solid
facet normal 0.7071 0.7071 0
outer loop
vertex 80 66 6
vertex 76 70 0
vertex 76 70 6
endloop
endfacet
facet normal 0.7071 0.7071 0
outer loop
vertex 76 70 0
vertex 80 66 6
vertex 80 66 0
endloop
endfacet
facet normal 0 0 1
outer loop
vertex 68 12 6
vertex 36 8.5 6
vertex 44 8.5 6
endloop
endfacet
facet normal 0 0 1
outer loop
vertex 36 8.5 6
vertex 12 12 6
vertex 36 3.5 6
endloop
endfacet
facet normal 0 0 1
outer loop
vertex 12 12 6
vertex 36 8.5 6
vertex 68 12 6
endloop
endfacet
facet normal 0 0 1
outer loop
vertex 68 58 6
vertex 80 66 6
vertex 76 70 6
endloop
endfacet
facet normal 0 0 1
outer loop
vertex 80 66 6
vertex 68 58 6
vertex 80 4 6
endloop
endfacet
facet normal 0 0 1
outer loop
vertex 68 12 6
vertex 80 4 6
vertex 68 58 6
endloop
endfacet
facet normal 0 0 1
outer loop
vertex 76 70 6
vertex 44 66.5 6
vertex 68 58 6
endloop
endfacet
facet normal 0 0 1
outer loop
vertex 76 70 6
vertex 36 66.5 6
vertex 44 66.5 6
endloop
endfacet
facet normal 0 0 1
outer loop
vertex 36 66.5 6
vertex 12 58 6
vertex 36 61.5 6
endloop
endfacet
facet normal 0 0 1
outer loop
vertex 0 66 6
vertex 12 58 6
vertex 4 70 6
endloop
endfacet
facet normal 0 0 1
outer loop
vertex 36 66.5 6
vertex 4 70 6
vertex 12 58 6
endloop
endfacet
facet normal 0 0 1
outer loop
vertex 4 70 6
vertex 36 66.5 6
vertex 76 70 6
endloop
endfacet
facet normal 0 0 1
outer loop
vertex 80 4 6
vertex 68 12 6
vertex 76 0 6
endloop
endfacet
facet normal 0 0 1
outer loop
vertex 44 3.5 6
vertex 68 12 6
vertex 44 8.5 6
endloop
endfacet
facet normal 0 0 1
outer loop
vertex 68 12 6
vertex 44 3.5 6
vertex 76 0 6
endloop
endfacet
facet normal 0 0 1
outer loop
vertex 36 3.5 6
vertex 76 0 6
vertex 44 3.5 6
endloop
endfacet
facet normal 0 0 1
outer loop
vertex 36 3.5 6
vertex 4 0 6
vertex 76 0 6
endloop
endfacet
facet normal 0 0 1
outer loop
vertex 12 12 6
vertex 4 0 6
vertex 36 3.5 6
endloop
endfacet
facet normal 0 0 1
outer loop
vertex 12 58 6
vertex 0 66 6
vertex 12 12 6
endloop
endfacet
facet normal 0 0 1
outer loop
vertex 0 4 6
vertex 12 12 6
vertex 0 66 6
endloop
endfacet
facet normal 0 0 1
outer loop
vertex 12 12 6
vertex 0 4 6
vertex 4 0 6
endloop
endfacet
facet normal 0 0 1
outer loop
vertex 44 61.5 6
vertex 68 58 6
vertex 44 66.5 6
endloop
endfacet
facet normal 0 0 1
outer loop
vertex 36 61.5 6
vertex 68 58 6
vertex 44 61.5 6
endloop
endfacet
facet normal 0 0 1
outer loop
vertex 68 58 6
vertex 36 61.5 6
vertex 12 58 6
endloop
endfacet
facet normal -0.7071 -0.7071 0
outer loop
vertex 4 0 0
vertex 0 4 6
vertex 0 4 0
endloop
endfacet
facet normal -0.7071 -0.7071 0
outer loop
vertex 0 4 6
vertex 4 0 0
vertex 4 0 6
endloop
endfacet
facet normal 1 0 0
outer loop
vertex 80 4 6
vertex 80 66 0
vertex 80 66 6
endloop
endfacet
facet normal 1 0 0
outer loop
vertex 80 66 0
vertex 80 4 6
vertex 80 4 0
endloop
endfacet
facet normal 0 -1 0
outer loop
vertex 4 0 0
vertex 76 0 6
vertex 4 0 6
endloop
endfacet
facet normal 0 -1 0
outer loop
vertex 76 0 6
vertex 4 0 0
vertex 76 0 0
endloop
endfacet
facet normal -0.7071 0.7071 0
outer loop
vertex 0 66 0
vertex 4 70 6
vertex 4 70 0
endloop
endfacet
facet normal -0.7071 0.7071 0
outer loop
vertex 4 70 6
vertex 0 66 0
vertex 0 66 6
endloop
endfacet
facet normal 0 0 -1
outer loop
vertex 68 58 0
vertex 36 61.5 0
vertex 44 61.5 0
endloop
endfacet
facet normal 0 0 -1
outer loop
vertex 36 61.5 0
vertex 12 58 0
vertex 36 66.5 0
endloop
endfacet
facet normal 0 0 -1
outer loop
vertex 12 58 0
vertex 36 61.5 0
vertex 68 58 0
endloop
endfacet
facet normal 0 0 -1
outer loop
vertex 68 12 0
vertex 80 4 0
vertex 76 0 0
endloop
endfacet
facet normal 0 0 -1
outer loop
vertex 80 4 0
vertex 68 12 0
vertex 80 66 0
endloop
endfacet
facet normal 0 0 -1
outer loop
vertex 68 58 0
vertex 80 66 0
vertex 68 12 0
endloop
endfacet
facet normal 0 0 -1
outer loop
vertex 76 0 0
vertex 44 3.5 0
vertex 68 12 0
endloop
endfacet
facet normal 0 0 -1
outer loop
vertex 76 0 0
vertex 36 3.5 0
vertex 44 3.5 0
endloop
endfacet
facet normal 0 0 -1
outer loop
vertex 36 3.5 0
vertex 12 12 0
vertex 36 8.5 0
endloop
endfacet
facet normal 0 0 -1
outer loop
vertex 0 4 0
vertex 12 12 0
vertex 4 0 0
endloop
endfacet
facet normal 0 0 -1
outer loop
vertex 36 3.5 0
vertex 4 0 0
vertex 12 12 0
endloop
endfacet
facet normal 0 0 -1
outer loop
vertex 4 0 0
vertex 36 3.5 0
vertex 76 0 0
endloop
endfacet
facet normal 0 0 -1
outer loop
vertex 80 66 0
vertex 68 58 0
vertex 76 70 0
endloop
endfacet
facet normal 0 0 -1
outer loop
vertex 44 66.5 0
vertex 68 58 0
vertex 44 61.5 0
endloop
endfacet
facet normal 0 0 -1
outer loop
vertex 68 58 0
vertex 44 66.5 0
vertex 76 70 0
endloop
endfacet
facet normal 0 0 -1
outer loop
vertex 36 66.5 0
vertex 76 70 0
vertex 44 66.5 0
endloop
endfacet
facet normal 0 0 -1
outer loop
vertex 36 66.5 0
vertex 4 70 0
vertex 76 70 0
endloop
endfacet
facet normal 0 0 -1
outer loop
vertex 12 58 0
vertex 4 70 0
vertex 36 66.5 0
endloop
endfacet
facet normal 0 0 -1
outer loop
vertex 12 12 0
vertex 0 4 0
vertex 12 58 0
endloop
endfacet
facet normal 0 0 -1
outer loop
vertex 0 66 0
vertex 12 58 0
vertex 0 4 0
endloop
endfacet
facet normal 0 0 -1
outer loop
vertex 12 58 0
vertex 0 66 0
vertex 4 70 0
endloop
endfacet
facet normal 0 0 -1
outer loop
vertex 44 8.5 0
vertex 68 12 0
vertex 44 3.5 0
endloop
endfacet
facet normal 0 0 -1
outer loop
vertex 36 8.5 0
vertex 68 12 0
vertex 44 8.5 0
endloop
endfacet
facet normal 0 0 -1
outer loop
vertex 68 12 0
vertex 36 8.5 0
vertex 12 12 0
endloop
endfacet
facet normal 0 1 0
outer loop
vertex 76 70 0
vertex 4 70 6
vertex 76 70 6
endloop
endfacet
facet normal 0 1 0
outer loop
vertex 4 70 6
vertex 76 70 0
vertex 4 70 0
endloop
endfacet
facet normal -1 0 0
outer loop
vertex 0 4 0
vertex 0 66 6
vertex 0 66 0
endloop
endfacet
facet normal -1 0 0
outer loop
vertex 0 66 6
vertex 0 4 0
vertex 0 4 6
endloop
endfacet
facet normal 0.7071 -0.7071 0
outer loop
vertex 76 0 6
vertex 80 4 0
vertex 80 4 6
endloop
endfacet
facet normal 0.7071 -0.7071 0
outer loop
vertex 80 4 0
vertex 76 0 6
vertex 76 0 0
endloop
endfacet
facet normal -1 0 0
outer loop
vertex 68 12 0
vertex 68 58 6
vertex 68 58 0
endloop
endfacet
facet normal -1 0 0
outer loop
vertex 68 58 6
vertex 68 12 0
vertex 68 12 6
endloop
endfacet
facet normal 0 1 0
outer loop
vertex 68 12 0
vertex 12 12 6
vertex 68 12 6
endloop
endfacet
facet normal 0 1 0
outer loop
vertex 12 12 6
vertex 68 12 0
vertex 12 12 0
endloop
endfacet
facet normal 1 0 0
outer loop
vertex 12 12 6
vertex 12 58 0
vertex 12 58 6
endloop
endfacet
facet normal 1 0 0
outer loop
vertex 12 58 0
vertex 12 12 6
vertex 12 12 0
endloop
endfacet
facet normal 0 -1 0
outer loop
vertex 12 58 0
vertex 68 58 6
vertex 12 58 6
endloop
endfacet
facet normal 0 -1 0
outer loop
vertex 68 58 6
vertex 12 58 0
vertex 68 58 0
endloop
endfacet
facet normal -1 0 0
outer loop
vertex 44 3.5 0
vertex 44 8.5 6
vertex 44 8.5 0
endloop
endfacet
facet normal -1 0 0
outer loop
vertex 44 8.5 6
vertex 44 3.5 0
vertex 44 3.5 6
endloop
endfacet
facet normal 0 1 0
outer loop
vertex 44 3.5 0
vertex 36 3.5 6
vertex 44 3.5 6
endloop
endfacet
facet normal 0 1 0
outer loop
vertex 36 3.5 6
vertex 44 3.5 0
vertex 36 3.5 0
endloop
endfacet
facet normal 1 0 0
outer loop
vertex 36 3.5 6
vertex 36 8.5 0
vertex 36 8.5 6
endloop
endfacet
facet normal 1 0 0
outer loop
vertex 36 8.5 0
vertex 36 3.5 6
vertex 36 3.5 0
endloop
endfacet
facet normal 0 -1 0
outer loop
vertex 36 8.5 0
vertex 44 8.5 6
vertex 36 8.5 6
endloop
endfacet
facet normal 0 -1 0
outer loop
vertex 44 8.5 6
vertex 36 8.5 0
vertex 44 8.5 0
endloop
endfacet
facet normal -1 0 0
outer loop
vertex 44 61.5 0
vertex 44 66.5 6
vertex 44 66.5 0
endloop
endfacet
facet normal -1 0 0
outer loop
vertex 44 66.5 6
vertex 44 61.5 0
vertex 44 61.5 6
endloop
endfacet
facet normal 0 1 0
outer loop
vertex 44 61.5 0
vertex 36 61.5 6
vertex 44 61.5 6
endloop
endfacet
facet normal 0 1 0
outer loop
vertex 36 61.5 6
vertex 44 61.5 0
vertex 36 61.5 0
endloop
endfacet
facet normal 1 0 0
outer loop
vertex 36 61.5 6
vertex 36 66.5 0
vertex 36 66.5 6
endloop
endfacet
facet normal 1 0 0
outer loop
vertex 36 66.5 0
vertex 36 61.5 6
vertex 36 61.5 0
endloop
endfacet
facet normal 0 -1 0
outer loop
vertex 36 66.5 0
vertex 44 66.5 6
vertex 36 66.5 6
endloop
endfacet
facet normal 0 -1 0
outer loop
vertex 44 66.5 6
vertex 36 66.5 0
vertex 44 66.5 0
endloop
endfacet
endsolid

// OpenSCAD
$fn = 32;

// ----------------------------------------------------------------------
// Frame plate: 80 x 70 frame, 12 mm rails
// ----------------------------------------------------------------------

// --- parameters (mm) ---
plate_l = 80;             // plate length, X
plate_w = 70;             // plate width, Y
plate_t = 6;              // plate thickness, Z (extrusion height)
corner_c = 4;             // corner chamfer
frame_bar = 12;           // frame rail width
slot_l = 8;               // adjustment slot length
slot_w = 5;               // adjustment slot width

win_l = plate_l - 2 * frame_bar;  // window length
win_w = plate_w - 2 * frame_bar;  // window width

profile = [[4, 0], [76, 0], [80, 4], [80, 66], [76, 70], [4, 70], [0, 66], [0, 4]];  // primary outline, 8 points, counter clockwise
void_1 = [[12, 12], [68, 12], [68, 58], [12, 58]];  // the window, 4 points
void_2 = [[36, 3.5], [44, 3.5], [44, 8.5], [36, 8.5]];  // adjustment slot, 4 points
void_3 = [[36, 61.5], [44, 61.5], [44, 66.5], [36, 66.5]];  // adjustment slot, 4 points

// --- the one profile operation ---
difference() {
  linear_extrude(height = plate_t) polygon(points = profile);
  translate([0, 0, -1])
    linear_extrude(height = plate_t + 2) polygon(points = void_1);
  translate([0, 0, -1])
    linear_extrude(height = plate_t + 2) polygon(points = void_2);
  translate([0, 0, -1])
    linear_extrude(height = plate_t + 2) polygon(points = void_3);
}
